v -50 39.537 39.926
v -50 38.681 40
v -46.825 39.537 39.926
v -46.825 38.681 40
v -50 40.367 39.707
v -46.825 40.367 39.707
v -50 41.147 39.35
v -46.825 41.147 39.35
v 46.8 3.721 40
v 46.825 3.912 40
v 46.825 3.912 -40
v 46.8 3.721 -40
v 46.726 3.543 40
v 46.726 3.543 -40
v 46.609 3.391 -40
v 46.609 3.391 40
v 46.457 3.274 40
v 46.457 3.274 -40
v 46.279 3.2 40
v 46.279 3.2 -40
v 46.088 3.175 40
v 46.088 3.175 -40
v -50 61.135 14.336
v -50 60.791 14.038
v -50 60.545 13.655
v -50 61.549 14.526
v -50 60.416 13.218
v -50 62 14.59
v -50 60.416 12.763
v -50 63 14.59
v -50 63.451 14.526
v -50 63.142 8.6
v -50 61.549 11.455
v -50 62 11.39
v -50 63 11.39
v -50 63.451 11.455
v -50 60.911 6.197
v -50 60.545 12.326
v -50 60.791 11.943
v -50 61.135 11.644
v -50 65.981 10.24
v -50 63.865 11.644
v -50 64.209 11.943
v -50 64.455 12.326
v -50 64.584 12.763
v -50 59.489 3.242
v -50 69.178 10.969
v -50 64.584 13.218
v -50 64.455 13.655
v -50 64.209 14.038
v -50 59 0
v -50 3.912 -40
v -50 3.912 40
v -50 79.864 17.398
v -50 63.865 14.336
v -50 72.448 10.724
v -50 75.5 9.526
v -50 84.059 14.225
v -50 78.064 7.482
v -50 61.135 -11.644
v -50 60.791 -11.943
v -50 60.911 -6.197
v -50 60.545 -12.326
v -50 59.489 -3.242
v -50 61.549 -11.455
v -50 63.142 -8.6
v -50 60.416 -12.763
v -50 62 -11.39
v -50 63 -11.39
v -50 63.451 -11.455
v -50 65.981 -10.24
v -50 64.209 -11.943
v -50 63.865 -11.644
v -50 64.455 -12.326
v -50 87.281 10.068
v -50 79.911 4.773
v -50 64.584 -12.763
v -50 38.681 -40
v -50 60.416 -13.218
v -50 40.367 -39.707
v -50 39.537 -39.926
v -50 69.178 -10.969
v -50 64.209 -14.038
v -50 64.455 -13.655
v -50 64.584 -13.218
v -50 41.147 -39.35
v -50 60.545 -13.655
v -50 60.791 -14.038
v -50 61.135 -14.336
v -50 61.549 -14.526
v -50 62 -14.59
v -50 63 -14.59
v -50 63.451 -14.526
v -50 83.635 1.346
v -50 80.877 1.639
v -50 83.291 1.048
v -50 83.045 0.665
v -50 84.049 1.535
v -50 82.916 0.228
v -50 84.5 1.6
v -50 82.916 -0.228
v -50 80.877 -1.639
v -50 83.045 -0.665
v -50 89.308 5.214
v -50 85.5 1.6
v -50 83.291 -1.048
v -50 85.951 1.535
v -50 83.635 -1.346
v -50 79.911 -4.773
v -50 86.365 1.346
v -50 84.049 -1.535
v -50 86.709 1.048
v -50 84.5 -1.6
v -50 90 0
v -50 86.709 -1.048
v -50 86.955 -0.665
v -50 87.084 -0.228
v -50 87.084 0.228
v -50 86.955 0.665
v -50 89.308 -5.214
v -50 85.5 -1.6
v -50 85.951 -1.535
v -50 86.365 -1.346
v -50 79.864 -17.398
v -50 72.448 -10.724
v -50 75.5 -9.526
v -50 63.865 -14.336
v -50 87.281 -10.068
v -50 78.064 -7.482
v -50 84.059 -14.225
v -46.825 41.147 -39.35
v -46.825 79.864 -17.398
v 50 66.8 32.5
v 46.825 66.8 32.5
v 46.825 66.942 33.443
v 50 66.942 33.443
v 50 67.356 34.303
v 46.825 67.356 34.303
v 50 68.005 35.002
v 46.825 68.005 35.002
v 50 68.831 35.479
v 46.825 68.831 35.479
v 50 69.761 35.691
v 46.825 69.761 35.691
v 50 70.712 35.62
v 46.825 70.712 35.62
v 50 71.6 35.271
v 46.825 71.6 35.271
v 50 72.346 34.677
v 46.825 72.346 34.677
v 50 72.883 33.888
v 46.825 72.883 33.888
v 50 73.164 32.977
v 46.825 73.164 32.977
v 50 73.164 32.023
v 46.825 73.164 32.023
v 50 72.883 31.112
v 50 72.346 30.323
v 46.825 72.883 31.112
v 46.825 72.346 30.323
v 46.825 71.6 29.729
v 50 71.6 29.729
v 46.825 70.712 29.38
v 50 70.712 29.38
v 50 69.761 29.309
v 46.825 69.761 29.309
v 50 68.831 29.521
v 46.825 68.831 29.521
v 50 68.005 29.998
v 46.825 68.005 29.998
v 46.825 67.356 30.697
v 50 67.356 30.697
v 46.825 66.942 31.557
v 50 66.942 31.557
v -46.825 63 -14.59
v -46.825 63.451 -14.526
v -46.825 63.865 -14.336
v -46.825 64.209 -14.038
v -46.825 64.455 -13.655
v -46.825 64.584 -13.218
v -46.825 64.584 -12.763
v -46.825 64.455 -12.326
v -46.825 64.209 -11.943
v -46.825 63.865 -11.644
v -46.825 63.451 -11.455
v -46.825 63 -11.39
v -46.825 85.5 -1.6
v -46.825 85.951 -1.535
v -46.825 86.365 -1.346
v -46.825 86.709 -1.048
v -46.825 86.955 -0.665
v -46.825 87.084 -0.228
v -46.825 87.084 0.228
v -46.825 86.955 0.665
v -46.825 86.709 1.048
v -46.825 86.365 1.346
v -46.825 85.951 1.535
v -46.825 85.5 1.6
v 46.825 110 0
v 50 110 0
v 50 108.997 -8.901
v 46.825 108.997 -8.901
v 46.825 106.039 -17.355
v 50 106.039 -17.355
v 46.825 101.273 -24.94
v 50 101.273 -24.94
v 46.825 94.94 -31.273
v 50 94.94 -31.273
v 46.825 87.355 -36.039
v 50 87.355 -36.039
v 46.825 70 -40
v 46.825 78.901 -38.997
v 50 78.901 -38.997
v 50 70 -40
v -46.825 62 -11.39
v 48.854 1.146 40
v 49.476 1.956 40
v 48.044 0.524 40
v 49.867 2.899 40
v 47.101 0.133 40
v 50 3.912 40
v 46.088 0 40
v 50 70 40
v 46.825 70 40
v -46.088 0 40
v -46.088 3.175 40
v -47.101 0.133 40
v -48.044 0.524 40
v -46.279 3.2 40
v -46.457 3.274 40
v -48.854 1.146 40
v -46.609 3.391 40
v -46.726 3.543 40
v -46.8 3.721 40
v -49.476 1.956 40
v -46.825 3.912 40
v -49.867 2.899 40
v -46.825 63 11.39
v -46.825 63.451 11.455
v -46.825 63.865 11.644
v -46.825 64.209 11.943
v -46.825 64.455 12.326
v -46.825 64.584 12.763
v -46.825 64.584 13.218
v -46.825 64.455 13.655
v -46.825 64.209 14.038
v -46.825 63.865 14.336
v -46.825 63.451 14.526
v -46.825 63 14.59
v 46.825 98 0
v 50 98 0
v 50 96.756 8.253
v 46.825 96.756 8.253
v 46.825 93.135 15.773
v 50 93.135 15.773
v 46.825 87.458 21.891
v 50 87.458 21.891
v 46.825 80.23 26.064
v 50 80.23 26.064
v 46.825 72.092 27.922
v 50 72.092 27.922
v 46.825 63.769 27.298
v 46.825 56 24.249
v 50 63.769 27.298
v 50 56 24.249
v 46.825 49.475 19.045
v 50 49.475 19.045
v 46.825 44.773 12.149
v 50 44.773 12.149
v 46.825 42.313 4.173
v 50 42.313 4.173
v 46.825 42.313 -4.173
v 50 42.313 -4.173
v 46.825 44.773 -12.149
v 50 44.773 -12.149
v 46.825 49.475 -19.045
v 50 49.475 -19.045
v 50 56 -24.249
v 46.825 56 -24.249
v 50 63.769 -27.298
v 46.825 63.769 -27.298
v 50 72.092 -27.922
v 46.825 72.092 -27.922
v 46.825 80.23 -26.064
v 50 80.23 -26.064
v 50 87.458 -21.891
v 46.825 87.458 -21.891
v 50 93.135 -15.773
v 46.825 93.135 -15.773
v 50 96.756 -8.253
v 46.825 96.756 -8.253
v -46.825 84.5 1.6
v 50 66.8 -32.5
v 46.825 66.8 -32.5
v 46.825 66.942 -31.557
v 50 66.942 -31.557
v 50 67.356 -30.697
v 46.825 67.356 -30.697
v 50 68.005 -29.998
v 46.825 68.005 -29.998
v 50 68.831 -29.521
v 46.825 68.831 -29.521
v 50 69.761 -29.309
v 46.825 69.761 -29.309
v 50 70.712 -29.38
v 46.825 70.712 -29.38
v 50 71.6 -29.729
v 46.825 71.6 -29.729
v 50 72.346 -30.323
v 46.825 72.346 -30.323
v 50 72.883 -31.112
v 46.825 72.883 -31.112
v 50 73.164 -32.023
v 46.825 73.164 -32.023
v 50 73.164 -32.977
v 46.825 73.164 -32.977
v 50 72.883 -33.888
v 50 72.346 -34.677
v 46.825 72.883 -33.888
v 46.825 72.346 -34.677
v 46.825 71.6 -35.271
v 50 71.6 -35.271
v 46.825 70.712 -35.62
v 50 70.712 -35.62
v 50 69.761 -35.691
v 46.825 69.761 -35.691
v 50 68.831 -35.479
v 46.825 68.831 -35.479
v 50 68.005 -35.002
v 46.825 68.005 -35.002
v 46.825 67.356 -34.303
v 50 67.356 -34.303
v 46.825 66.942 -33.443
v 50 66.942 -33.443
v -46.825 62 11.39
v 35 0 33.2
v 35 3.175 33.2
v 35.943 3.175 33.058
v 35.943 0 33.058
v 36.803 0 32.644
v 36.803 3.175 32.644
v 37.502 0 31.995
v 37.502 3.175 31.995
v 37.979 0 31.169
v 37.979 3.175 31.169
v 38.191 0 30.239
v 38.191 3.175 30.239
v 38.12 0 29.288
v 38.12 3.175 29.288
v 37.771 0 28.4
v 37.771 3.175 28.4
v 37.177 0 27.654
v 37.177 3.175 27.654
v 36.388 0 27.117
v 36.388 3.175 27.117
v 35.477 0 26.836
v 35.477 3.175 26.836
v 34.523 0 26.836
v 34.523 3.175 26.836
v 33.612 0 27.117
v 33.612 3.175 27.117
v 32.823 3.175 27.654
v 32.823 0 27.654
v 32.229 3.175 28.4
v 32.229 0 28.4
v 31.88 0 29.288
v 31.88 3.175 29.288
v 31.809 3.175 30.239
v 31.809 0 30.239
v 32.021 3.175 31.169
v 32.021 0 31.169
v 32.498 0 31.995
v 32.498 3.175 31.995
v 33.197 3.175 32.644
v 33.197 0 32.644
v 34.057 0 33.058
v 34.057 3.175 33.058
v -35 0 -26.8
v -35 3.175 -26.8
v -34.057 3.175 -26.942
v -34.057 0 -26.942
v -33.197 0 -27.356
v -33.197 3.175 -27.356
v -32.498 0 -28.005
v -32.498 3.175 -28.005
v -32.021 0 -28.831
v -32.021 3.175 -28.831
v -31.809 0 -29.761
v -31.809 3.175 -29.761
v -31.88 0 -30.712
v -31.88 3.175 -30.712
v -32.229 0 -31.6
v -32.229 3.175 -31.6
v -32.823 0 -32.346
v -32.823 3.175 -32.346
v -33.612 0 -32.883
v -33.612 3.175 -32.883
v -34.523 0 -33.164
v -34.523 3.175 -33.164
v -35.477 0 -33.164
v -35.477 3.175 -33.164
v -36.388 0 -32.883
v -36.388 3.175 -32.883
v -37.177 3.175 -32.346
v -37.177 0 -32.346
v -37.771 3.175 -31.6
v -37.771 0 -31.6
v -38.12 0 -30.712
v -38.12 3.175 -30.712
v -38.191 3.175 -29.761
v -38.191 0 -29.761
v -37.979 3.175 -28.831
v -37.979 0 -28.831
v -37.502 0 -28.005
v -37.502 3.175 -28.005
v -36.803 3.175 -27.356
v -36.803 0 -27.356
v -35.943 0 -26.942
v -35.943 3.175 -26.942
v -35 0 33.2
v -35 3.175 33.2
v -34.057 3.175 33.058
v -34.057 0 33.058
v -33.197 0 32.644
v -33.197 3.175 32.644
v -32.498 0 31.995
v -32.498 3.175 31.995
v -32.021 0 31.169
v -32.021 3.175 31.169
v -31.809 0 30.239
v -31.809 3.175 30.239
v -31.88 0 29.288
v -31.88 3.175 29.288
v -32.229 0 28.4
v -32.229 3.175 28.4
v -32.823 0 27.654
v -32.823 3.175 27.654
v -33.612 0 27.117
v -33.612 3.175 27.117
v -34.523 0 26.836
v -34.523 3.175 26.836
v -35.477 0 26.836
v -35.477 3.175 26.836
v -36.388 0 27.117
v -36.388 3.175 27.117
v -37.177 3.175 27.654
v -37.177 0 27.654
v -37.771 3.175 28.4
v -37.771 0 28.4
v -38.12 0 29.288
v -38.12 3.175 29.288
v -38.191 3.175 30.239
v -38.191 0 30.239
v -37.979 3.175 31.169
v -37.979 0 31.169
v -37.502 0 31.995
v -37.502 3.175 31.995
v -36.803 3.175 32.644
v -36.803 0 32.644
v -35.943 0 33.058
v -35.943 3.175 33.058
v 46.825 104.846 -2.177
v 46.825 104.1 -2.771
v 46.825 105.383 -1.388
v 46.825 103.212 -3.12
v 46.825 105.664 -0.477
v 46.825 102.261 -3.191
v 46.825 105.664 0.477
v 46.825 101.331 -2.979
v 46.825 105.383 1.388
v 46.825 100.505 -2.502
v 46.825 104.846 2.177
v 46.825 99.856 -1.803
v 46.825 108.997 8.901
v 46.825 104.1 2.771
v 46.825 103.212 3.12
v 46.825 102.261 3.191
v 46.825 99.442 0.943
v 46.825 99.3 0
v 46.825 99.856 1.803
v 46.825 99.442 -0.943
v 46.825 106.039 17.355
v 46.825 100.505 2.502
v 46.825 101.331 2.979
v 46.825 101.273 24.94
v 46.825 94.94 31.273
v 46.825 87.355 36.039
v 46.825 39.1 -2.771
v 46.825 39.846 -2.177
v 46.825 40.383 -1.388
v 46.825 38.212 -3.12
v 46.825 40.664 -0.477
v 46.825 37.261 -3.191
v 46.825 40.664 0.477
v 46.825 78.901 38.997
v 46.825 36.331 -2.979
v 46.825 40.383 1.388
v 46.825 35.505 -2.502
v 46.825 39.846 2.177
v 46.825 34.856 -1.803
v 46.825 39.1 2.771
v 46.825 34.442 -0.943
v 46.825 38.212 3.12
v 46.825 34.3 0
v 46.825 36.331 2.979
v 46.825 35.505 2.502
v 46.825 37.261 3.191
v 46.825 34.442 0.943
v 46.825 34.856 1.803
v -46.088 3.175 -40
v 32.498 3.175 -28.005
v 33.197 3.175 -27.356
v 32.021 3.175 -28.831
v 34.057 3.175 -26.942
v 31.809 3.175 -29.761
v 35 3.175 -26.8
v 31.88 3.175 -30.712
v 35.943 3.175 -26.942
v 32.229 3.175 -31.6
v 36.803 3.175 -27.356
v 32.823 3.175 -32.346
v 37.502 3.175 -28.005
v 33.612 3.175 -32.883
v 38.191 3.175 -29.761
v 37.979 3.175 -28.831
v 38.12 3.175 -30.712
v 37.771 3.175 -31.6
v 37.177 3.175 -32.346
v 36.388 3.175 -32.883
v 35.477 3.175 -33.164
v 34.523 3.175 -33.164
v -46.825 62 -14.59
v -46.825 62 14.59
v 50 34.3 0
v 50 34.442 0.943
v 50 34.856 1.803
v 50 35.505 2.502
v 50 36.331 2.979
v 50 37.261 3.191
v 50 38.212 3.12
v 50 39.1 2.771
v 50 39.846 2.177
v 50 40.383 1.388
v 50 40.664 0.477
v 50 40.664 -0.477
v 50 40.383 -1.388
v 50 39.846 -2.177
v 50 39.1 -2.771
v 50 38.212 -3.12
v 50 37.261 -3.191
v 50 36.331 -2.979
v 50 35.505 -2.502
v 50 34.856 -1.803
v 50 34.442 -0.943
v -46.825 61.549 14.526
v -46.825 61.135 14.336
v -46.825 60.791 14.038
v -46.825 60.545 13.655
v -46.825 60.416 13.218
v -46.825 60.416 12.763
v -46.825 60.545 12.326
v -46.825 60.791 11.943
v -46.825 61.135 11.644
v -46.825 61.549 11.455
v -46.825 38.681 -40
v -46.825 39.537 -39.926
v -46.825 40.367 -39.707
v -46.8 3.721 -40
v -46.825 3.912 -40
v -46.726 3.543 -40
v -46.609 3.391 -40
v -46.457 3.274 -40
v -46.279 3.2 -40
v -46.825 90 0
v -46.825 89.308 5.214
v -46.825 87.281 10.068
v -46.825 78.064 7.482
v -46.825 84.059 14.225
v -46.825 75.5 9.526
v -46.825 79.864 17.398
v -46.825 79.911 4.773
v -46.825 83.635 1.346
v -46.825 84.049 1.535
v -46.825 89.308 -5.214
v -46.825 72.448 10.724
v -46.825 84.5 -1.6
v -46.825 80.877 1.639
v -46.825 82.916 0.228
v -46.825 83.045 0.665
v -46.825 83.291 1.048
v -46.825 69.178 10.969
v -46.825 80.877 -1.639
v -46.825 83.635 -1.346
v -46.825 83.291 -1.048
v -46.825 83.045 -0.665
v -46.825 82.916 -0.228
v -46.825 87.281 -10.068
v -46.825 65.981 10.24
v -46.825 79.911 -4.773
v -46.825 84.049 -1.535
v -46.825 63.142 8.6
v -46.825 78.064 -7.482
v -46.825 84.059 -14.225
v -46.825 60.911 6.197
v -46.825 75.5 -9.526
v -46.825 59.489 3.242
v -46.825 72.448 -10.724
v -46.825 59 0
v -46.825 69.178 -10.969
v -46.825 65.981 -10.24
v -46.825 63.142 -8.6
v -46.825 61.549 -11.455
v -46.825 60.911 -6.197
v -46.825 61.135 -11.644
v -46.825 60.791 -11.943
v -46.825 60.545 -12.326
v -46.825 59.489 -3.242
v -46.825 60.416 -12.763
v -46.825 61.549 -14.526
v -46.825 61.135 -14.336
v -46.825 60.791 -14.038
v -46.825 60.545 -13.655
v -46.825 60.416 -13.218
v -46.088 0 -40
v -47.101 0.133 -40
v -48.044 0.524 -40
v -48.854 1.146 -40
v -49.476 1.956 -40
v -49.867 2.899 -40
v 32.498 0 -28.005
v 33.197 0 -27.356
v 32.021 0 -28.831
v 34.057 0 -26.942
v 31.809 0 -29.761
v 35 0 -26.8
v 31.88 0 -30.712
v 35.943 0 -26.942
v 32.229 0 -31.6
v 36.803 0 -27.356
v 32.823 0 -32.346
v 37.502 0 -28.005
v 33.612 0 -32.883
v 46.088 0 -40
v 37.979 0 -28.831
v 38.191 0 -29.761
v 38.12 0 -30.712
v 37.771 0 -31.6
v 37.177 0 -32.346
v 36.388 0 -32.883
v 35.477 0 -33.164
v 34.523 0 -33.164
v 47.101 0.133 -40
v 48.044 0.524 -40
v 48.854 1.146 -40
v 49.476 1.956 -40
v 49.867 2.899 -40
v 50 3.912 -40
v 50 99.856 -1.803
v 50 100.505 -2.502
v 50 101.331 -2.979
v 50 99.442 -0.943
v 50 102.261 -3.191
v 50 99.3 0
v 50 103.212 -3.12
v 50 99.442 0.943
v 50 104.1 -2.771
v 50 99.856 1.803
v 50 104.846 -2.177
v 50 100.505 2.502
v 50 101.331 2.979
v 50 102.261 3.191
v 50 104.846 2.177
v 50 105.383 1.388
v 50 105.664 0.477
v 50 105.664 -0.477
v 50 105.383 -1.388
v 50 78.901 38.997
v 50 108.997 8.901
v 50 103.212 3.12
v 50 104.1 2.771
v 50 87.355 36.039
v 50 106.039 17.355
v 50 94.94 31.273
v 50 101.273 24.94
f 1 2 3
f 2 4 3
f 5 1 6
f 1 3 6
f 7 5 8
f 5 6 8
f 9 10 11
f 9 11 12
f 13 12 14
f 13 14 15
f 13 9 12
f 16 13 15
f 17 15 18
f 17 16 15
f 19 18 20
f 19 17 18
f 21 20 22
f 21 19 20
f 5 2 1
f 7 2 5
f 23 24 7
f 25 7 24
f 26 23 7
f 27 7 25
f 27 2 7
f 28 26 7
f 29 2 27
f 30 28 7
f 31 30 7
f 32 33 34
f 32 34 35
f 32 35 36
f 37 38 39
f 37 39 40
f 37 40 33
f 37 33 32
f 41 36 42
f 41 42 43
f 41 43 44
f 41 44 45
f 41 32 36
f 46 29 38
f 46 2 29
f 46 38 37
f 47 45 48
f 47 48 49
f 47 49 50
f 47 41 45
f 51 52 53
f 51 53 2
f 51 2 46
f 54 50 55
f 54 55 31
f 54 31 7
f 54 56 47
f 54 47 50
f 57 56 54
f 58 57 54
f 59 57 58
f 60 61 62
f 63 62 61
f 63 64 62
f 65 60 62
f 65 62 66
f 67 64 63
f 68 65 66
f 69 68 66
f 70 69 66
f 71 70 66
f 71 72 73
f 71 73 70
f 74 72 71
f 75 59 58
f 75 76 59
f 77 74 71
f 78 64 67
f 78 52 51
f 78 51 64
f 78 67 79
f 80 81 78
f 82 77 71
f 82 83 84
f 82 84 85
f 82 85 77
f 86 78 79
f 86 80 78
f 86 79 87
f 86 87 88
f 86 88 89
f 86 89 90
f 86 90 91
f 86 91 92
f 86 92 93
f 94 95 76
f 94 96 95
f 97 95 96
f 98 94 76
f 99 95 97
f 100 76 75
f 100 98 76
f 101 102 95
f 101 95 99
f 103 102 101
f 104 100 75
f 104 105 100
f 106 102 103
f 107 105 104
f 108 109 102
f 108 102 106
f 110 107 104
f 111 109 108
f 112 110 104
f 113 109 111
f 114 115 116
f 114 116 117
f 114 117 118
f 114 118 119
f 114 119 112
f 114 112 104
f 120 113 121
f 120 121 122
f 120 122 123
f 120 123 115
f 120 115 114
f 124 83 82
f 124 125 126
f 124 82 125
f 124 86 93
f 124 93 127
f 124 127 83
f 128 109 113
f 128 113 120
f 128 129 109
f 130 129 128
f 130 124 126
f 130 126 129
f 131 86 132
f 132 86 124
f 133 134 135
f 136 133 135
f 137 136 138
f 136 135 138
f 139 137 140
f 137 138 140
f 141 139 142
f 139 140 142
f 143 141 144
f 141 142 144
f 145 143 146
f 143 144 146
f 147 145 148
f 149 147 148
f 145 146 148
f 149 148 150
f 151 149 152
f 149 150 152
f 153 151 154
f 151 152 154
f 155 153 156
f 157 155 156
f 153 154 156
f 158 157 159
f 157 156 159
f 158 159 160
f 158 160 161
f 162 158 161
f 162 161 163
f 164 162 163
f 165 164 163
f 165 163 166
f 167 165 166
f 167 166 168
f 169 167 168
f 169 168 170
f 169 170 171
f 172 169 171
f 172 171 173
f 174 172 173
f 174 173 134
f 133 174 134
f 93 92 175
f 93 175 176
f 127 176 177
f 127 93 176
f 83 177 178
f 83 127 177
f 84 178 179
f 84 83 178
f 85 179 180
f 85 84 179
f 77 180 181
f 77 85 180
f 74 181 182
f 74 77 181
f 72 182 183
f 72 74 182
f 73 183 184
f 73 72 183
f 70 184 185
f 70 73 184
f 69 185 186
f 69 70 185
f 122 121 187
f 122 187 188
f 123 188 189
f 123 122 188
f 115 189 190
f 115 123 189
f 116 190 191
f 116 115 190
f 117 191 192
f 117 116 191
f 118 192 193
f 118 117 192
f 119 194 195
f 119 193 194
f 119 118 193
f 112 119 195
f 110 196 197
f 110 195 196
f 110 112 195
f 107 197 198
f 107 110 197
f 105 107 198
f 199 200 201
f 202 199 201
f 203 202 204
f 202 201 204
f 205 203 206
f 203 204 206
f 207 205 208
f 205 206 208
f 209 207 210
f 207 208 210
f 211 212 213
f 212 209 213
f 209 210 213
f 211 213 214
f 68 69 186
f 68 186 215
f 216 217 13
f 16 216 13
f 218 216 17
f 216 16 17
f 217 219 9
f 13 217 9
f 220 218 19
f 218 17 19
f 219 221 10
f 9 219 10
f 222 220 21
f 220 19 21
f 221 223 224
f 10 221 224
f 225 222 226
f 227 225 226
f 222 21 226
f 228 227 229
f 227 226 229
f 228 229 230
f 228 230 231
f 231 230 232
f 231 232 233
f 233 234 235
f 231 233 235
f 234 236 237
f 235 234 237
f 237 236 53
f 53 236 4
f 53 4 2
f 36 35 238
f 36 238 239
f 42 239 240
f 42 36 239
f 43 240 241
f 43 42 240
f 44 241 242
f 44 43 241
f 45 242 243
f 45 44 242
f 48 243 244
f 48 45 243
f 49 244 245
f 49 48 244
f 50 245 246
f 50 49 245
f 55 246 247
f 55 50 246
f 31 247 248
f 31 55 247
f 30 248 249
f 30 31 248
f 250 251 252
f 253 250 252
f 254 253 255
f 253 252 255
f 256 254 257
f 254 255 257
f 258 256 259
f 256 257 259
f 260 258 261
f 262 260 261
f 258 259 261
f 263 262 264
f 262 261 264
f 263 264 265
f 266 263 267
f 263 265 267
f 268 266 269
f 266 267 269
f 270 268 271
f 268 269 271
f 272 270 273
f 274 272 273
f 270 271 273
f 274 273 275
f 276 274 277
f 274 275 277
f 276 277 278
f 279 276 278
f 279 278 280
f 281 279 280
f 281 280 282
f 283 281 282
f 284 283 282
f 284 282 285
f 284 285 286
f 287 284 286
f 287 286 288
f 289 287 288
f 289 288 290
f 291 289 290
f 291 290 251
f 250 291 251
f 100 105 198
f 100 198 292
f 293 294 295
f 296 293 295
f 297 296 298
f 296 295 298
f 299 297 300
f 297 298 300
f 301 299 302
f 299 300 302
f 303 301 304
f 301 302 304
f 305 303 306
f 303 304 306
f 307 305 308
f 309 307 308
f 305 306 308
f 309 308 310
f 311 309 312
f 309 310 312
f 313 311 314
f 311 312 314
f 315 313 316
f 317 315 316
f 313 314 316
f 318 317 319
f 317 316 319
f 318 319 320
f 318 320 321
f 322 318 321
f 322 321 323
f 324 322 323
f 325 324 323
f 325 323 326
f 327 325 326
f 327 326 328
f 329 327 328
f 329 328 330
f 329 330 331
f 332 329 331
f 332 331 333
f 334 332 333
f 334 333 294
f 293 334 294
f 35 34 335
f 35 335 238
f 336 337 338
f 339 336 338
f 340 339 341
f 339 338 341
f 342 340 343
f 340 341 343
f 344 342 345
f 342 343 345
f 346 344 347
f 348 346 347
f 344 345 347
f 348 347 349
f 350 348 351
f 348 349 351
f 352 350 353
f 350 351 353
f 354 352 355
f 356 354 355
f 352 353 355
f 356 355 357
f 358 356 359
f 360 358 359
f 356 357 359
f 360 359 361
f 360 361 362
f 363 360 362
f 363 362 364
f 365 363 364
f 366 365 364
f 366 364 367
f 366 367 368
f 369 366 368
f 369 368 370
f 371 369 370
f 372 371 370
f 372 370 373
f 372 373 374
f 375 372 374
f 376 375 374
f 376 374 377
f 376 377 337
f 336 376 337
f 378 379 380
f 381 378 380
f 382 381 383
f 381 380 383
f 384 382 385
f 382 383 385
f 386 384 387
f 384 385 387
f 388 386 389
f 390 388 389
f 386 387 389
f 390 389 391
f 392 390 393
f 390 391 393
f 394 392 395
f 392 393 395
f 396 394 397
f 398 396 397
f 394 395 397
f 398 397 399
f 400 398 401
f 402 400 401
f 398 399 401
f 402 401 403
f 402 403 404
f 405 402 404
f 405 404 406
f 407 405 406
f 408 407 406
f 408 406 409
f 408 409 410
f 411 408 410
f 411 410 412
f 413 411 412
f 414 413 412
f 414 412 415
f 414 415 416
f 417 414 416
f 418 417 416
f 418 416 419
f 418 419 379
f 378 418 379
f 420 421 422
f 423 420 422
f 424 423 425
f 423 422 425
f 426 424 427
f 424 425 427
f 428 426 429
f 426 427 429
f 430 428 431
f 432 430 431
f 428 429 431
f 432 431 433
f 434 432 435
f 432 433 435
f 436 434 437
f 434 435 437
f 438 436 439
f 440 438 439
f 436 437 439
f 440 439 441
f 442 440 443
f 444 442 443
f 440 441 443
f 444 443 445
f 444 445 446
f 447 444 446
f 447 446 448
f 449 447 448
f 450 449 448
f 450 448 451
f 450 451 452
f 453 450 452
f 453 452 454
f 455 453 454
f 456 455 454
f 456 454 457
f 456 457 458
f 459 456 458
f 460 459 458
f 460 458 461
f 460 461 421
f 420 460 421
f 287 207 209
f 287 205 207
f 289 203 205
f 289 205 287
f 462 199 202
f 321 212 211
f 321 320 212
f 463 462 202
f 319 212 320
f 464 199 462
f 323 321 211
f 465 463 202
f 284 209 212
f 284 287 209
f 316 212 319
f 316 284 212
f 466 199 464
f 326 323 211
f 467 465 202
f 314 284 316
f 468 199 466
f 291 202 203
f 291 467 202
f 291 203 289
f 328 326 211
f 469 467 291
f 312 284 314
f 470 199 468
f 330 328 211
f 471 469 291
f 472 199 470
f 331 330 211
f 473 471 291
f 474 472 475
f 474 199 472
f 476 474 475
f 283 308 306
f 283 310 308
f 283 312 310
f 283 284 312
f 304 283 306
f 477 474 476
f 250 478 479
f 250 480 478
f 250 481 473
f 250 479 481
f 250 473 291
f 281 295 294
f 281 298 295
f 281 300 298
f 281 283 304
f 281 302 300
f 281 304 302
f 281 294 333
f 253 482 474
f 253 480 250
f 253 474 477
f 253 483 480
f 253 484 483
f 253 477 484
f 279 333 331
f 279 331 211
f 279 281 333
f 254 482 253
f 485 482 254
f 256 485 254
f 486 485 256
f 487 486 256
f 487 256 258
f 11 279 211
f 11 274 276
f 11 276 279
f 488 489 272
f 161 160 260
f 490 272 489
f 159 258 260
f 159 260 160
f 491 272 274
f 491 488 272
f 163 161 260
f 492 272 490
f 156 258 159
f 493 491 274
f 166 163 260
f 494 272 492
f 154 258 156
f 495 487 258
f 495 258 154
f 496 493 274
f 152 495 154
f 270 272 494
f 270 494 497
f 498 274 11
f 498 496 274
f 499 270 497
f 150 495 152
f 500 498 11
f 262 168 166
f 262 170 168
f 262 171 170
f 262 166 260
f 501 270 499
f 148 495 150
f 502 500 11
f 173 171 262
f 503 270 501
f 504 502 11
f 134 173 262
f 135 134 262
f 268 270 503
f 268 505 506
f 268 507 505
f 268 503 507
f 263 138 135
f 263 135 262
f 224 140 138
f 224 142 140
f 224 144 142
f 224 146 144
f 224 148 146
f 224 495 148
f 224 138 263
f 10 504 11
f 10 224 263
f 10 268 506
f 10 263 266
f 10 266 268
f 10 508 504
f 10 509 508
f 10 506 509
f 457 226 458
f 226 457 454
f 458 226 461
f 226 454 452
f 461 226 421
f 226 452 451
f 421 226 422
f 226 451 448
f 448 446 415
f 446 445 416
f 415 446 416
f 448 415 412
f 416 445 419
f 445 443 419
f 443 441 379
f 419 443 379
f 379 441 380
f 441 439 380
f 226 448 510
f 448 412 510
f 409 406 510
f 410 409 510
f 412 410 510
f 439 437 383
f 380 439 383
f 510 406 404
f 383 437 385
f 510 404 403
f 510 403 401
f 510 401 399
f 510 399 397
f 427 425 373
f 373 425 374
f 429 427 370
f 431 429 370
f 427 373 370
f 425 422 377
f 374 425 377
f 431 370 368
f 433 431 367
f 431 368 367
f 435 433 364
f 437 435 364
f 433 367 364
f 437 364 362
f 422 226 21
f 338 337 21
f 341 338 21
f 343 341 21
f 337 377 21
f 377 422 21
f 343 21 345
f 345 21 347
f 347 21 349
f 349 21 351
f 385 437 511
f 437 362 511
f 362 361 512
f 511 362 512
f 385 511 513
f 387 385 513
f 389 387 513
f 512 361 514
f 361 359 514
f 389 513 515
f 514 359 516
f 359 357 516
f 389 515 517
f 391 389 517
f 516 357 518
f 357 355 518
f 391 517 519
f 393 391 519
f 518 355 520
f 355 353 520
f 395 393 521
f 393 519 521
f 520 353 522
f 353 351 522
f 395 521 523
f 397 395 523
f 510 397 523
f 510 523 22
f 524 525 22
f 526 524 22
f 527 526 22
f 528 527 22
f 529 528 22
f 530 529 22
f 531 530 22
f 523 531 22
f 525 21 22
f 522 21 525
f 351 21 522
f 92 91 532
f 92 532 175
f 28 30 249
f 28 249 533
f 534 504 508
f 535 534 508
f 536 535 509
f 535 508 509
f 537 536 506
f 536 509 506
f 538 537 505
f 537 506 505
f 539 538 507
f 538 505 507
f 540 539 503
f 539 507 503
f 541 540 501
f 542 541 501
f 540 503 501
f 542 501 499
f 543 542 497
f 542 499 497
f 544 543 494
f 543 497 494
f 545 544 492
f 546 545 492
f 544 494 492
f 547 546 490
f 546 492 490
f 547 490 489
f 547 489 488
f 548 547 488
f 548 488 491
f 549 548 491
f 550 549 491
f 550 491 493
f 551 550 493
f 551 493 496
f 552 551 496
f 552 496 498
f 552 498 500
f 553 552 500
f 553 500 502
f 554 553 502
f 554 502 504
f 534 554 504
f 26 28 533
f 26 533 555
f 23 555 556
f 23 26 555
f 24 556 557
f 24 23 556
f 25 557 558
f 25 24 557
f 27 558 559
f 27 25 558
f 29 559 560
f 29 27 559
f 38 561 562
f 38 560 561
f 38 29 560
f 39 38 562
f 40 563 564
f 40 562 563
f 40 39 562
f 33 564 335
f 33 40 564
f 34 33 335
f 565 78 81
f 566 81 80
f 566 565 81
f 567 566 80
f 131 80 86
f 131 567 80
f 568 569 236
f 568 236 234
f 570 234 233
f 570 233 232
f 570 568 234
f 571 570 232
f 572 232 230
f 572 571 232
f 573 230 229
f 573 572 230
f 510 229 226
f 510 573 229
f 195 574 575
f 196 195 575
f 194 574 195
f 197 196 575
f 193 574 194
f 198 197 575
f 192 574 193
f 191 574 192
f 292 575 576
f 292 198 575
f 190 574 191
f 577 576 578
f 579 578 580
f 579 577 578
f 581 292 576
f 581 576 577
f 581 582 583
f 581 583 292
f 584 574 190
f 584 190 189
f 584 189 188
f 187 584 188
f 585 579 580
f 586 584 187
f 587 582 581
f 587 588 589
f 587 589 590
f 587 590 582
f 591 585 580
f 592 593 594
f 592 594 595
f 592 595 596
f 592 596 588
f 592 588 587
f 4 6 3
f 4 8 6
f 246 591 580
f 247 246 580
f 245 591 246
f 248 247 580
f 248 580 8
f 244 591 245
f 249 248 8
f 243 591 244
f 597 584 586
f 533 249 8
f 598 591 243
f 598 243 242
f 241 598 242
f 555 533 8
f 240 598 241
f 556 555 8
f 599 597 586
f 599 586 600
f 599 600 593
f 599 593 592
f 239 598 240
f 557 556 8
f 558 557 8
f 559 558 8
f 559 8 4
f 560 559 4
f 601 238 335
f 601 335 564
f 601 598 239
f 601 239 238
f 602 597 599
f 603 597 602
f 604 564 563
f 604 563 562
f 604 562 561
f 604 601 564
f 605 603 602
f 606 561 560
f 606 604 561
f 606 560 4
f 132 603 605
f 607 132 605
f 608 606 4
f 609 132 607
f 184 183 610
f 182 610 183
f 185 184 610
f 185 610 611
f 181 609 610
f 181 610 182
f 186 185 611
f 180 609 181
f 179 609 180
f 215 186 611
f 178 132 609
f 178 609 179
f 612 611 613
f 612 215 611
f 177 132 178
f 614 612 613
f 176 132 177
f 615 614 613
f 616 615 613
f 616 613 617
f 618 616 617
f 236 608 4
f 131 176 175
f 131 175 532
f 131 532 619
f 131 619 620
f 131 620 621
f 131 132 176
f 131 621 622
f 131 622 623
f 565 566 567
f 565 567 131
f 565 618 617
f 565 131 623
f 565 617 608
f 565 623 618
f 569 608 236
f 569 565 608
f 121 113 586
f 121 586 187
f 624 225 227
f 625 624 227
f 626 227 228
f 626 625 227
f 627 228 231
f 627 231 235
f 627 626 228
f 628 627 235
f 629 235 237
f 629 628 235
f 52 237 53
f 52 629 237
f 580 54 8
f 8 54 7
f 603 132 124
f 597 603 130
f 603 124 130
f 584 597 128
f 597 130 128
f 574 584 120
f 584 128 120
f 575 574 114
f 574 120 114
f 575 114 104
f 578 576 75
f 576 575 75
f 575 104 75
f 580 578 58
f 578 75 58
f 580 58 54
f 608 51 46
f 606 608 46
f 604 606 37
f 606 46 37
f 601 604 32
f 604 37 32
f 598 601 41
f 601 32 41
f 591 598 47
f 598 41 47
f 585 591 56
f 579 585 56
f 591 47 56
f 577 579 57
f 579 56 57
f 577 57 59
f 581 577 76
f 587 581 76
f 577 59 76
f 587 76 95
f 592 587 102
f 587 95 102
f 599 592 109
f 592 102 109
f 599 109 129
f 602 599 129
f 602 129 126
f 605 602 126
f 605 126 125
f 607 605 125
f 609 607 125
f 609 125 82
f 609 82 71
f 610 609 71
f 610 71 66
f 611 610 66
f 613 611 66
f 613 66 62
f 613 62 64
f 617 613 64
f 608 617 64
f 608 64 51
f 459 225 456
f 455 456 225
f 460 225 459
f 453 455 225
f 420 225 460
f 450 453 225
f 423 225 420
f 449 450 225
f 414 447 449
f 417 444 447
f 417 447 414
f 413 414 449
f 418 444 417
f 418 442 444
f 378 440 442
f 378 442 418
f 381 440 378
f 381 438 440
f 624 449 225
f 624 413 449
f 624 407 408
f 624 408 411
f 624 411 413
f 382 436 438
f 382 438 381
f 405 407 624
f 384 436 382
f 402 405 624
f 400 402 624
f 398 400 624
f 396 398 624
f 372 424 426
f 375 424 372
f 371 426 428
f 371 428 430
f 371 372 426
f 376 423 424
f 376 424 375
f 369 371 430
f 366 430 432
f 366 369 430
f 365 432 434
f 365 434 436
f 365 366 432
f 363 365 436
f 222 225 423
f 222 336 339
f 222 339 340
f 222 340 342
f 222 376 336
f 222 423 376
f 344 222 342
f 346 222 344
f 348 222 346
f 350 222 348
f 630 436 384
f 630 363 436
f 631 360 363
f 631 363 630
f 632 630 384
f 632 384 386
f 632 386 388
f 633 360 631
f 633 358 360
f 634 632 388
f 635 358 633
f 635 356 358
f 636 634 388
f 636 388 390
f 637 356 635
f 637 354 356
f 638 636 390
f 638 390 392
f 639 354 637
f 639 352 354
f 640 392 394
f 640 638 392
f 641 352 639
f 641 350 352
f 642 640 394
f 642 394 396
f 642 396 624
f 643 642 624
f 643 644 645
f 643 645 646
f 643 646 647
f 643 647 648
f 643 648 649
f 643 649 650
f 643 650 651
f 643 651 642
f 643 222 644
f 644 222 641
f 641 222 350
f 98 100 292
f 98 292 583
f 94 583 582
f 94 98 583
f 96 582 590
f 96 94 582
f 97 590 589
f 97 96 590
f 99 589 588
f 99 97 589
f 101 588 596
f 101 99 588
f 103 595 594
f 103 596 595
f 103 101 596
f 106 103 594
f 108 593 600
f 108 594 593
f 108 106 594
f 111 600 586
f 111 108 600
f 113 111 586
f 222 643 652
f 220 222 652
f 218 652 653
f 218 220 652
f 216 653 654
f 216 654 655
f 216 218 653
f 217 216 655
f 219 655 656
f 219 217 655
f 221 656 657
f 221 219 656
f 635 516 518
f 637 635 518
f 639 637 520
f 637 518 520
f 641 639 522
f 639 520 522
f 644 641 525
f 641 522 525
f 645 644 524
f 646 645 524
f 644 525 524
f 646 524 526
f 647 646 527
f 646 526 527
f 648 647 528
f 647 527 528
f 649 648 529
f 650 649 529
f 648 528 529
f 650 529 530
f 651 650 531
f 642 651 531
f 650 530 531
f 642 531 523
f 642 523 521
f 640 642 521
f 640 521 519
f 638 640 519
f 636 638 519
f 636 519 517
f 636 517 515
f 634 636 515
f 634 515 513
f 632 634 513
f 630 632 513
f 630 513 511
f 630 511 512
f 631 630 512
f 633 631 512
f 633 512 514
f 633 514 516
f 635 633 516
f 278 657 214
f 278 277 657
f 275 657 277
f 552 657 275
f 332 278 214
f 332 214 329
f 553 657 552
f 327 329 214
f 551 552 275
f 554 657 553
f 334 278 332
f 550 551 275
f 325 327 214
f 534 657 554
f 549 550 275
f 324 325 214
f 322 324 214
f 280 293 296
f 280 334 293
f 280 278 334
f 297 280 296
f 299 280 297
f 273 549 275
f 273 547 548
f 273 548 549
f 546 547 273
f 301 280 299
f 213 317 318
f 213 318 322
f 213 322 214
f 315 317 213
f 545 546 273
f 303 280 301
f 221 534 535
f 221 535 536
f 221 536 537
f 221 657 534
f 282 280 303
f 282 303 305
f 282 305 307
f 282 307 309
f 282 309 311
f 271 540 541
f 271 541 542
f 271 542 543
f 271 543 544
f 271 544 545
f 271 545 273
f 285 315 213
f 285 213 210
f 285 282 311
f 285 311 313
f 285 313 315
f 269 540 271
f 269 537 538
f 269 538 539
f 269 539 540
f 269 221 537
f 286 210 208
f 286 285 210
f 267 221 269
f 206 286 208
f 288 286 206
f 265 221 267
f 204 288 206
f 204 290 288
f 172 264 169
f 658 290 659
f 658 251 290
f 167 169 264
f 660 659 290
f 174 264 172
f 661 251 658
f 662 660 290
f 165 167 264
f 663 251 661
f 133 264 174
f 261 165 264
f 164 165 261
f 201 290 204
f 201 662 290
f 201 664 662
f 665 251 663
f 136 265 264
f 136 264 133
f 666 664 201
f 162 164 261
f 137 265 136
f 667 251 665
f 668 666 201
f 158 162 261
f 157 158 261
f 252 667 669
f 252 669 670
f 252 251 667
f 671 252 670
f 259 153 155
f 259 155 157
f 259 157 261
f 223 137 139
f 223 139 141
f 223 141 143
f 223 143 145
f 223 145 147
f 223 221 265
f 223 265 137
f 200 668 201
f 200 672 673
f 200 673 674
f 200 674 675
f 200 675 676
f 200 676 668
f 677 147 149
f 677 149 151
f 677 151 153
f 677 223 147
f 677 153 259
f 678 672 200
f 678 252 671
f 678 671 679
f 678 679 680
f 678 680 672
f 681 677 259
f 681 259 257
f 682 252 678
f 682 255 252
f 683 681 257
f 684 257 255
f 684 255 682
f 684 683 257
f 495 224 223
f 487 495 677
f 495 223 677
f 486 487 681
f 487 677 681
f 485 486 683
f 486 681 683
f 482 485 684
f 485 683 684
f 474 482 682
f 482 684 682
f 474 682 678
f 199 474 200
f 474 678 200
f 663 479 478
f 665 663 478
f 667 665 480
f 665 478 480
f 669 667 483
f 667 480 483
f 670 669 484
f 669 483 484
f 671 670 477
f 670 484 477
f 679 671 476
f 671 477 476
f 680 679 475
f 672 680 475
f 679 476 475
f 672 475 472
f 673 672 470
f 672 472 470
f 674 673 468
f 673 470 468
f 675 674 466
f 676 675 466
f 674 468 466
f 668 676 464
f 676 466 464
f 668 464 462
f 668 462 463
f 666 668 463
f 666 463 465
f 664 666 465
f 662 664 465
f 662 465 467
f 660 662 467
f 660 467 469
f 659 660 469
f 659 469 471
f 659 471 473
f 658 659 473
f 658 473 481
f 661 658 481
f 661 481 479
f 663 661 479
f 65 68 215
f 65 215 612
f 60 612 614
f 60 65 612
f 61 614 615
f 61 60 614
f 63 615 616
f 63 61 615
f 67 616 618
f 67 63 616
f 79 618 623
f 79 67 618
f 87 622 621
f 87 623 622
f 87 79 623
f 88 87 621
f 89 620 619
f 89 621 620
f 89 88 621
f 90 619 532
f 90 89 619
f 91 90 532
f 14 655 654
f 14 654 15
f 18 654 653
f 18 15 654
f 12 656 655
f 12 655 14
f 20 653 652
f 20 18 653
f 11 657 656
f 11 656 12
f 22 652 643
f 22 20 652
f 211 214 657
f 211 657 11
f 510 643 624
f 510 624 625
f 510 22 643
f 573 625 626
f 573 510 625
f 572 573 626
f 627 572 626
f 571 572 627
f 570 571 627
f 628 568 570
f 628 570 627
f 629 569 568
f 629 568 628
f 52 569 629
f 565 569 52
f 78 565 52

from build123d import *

# Parameters (mm, degrees)
SKETCH1_W                      = 80
SKETCH1_H                      = 100
BASE_FLANGE1_DEPTH             = 3.175
EDGE_FLANGE2_STRIP_W           = 14.1732
EDGE_FLANGE2_STRIP_H           = 3.175
EDGE_FLANGE2_STRIP_CUT_DEPTH   = 80
EDGE_FLANGE2_STRIP_2_W         = 14.1732
EDGE_FLANGE2_STRIP_2_H         = 3.175
EDGE_FLANGE2_STRIP_CUT_2_DEPTH = 80
EDGE_FLANGE2_DEPTH             = 80
EDGE_FLANGE2_BEND_DEPTH        = 80
CUT_EXTRUDE1_REACH             = 155.948
SKETCH12_R                     = 28
M6_CLEARANCE_HOLE1_D           = 6.4
M6_CLEARANCE_HOLE1_DEPTH       = 3.175
M6_CLEARANCE_HOLE2_D           = 6.4
CUT_EXTRUDE2_REACH             = 155.948
SKETCH19_R                     = 11
FILLET1_R                      = 5


# Sheet-metal steps are written as plain solids
with BuildPart() as part:
    # Sketch1 → Base-Flange1 (new body)
    with BuildSketch(Plane(origin=(0, 0, 0), x_dir=(0, 0, -1), z_dir=(0, -1, 0))):
        Rectangle(SKETCH1_W, SKETCH1_H)
    extrude(amount=-BASE_FLANGE1_DEPTH)

    # Edge-Flange2 strip (across the edge) → Edge-Flange2 strip cut (cut)
    with BuildSketch(Plane(origin=(50, 3.175, 40), x_dir=(-1, 0, 0), z_dir=(0, 0, -1))):
        with Locations((-3.175, -1.5875)):
            Rectangle(EDGE_FLANGE2_STRIP_W, EDGE_FLANGE2_STRIP_H)
    extrude(amount=EDGE_FLANGE2_STRIP_CUT_DEPTH, mode=Mode.SUBTRACT)

    # Edge-Flange2 strip 2 (across the edge) → Edge-Flange2 strip cut 2 (cut)
    with BuildSketch(Plane(origin=(-50, 3.175, -40), x_dir=(1, 0, 0), z_dir=(0, 0, 1))):
        with Locations((-3.175, -1.5875)):
            Rectangle(EDGE_FLANGE2_STRIP_2_W, EDGE_FLANGE2_STRIP_2_H)
    extrude(amount=EDGE_FLANGE2_STRIP_CUT_2_DEPTH, mode=Mode.SUBTRACT)

    # Edge-Flange2 section (across the edge) → Edge-Flange2 (add)
    with BuildSketch(Plane(origin=(50, 3.175, 40), x_dir=(-1, 0, 0), z_dir=(0, 0, -1))):
        with BuildLine():
            Line((0, 0.7366), (0, 106.825))
            Line((0, 106.825), (3.175, 106.825))
            Line((3.175, 106.825), (3.175, 0.7366))
            ThreePointArc((3.175, 0.7366), (3.390745145, 0.215745145), (3.9116, 0))
            Line((3.9116, 0), (3.9116, -3.175))
            ThreePointArc((3.9116, -3.175), (1.145681115, -2.029318885), (0, 0.7366))
        make_face()
    extrude(amount=EDGE_FLANGE2_DEPTH)

    # Edge-Flange2 section 2 (across the edge) → Edge-Flange2 bend (add)
    with BuildSketch(Plane(origin=(-50, 3.175, -40), x_dir=(1, 0, 0), z_dir=(0, 0, 1))):
        with BuildLine():
            Line((0, 0.7366), (0, 106.825))
            Line((0, 106.825), (3.175, 106.825))
            Line((3.175, 106.825), (3.175, 0.7366))
            ThreePointArc((3.175, 0.7366), (3.390745145, 0.215745145), (3.9116, 0))
            Line((3.9116, 0), (3.9116, -3.175))
            ThreePointArc((3.9116, -3.175), (1.145681115, -2.029318885), (0, 0.7366))
        make_face()
    extrude(amount=EDGE_FLANGE2_BEND_DEPTH)

    # Sketch12 → Cut-Extrude1 (cut, up to next)
    with BuildSketch(Plane(origin=(50, 0, 0), x_dir=(0, 0, -1), z_dir=(1, 0, 0)), mode=Mode.PRIVATE) as cut_extrude1_sk1:
        with BuildLine():
            Line((-40, 110), (-40, 70))
            ThreePointArc((-40, 70), (-28.284271269, 98.284271226), (-6.1e-08, 110))
            Line((-6.1e-08, 110), (-40, 110))
        make_face()
    cut_extrude1_tool1 = extrude(cut_extrude1_sk1.sketch, amount=-CUT_EXTRUDE1_REACH, mode=Mode.PRIVATE) & part.part
    # Sketch12 → Cut-Extrude1 (cut, up to next)
    with BuildSketch(Plane(origin=(50, 0, 0), x_dir=(0, 0, -1), z_dir=(1, 0, 0)), mode=Mode.PRIVATE) as cut_extrude1_sk2:
        with BuildLine():
            Line((40, 110), (-6.1e-08, 110))
            ThreePointArc((-6.1e-08, 110), (28.284271226, 98.284271269), (40, 70))
            Line((40, 70), (40, 110))
        make_face()
    cut_extrude1_tool2 = extrude(cut_extrude1_sk2.sketch, amount=-CUT_EXTRUDE1_REACH, mode=Mode.PRIVATE) & part.part
    # Sketch12 → Cut-Extrude1 (cut, up to next)
    with BuildSketch(Plane(origin=(50, 0, 0), x_dir=(0, 0, -1), z_dir=(1, 0, 0)), mode=Mode.PRIVATE) as cut_extrude1_sk3:
        with Locations(Location((0, 70, 0), (0, 0, 90))):
            Circle(SKETCH12_R)
    cut_extrude1_tool3 = extrude(cut_extrude1_sk3.sketch, amount=-CUT_EXTRUDE1_REACH, mode=Mode.PRIVATE) & part.part
    add(cut_extrude1_tool1.solids().sort_by_distance((50, 101.065282, 31.065282))[0], mode=Mode.SUBTRACT)
    add(cut_extrude1_tool2.solids().sort_by_distance((50, 101.065282, -31.065282))[0], mode=Mode.SUBTRACT)
    add(cut_extrude1_tool3.solids().sort_by_distance((50, 70, 0))[0], mode=Mode.SUBTRACT)

    # M6 Clearance Hole1
    with Locations(Plane(origin=(50, 70, 32.5), x_dir=(0, 1, 0), z_dir=(1, 0, 0))):
        with Locations((0, 0), (-32.5, -32.5), (0, -65), (32.5, -32.5)):
            Hole(M6_CLEARANCE_HOLE1_D / 2, depth=M6_CLEARANCE_HOLE1_DEPTH)

    # M6 Clearance Hole2 (through all)
    with Locations(Plane(origin=(-35, 0, 30), x_dir=(0, 0, -1), z_dir=(0, -1, 0))):
        with Locations((0, 0), (0, 70), (60, 0), (60, 70)):
            Hole(M6_CLEARANCE_HOLE2_D / 2)

    # Sketch19 → Cut-Extrude2 (cut, up to next)
    with BuildSketch(Plane.ZY.offset(50), mode=Mode.PRIVATE) as cut_extrude2_sk1:
        with BuildLine():
            Line((-40, 40), (-17.398181668, 79.864242224))
            ThreePointArc((-17.398181668, 79.864242224), (0, 90), (17.398181668, 79.864242224))
            Line((17.398181668, 79.864242224), (40, 40))
            Line((40, 40), (40, 110))
            Line((40, 110), (-40, 110))
            Line((-40, 110), (-40, 40))
        make_face()
    cut_extrude2_tool1 = extrude(cut_extrude2_sk1.sketch, amount=-CUT_EXTRUDE2_REACH, mode=Mode.PRIVATE) & part.part
    # Sketch19 → Cut-Extrude2 (cut, up to next)
    with BuildSketch(Plane.ZY.offset(50), mode=Mode.PRIVATE) as cut_extrude2_sk2:
        with Locations(Location((0, 70, 0), (0, 0, 270))):
            Circle(SKETCH19_R)
    cut_extrude2_tool2 = extrude(cut_extrude2_sk2.sketch, amount=-CUT_EXTRUDE2_REACH, mode=Mode.PRIVATE) & part.part
    # Sketch19 → Cut-Extrude2 (cut, up to next)
    with BuildSketch(Plane.ZY.offset(50), mode=Mode.PRIVATE) as cut_extrude2_sk3:
        with BuildLine():
            ThreePointArc((-11.390381057, 62), (-12.990381057, 60.4), (-14.590381057, 62))
            Line((-14.590381057, 62), (-14.590381057, 63))
            ThreePointArc((-14.590381057, 63), (-12.990381057, 64.6), (-11.390381057, 63))
            Line((-11.390381057, 63), (-11.390381057, 62))
        make_face()
    cut_extrude2_tool3 = extrude(cut_extrude2_sk3.sketch, amount=-CUT_EXTRUDE2_REACH, mode=Mode.PRIVATE) & part.part
    # Sketch19 → Cut-Extrude2 (cut, up to next)
    with BuildSketch(Plane.ZY.offset(50), mode=Mode.PRIVATE) as cut_extrude2_sk4:
        with BuildLine():
            ThreePointArc((14.590381057, 62), (12.990381057, 60.4), (11.390381057, 62))
            Line((11.390381057, 62), (11.390381057, 63))
            ThreePointArc((11.390381057, 63), (12.990381057, 64.6), (14.590381057, 63))
            Line((14.590381057, 63), (14.590381057, 62))
        make_face()
    cut_extrude2_tool4 = extrude(cut_extrude2_sk4.sketch, amount=-CUT_EXTRUDE2_REACH, mode=Mode.PRIVATE) & part.part
    # Sketch19 → Cut-Extrude2 (cut, up to next)
    with BuildSketch(Plane.ZY.offset(50), mode=Mode.PRIVATE) as cut_extrude2_sk5:
        with BuildLine():
            ThreePointArc((1.6, 84.5), (0, 82.9), (-1.6, 84.5))
            Line((-1.6, 84.5), (-1.6, 85.5))
            ThreePointArc((-1.6, 85.5), (0, 87.1), (1.6, 85.5))
            Line((1.6, 85.5), (1.6, 84.5))
        make_face()
    cut_extrude2_tool5 = extrude(cut_extrude2_sk5.sketch, amount=-CUT_EXTRUDE2_REACH, mode=Mode.PRIVATE) & part.part
    add(cut_extrude2_tool1.solids().sort_by_distance((-50, 60.456413, -29.623817))[0], mode=Mode.SUBTRACT)
    add(cut_extrude2_tool2.solids().sort_by_distance((-50, 70, 0))[0], mode=Mode.SUBTRACT)
    add(cut_extrude2_tool3.solids().sort_by_distance((-50, 62.5, -12.990381))[0], mode=Mode.SUBTRACT)
    add(cut_extrude2_tool4.solids().sort_by_distance((-50, 62.5, 12.990381))[0], mode=Mode.SUBTRACT)
    add(cut_extrude2_tool5.solids().sort_by_distance((-50, 85, 0))[0], mode=Mode.SUBTRACT)

    # Fillet1
    fillet1_edges = [part.edges().sort_by_distance(p)[0] for p in [
        (-48.4125, 40, 40),
        (-48.4125, 40, -40),
    ]]
    fillet(fillet1_edges, radius=FILLET1_R)


solid = part.part
